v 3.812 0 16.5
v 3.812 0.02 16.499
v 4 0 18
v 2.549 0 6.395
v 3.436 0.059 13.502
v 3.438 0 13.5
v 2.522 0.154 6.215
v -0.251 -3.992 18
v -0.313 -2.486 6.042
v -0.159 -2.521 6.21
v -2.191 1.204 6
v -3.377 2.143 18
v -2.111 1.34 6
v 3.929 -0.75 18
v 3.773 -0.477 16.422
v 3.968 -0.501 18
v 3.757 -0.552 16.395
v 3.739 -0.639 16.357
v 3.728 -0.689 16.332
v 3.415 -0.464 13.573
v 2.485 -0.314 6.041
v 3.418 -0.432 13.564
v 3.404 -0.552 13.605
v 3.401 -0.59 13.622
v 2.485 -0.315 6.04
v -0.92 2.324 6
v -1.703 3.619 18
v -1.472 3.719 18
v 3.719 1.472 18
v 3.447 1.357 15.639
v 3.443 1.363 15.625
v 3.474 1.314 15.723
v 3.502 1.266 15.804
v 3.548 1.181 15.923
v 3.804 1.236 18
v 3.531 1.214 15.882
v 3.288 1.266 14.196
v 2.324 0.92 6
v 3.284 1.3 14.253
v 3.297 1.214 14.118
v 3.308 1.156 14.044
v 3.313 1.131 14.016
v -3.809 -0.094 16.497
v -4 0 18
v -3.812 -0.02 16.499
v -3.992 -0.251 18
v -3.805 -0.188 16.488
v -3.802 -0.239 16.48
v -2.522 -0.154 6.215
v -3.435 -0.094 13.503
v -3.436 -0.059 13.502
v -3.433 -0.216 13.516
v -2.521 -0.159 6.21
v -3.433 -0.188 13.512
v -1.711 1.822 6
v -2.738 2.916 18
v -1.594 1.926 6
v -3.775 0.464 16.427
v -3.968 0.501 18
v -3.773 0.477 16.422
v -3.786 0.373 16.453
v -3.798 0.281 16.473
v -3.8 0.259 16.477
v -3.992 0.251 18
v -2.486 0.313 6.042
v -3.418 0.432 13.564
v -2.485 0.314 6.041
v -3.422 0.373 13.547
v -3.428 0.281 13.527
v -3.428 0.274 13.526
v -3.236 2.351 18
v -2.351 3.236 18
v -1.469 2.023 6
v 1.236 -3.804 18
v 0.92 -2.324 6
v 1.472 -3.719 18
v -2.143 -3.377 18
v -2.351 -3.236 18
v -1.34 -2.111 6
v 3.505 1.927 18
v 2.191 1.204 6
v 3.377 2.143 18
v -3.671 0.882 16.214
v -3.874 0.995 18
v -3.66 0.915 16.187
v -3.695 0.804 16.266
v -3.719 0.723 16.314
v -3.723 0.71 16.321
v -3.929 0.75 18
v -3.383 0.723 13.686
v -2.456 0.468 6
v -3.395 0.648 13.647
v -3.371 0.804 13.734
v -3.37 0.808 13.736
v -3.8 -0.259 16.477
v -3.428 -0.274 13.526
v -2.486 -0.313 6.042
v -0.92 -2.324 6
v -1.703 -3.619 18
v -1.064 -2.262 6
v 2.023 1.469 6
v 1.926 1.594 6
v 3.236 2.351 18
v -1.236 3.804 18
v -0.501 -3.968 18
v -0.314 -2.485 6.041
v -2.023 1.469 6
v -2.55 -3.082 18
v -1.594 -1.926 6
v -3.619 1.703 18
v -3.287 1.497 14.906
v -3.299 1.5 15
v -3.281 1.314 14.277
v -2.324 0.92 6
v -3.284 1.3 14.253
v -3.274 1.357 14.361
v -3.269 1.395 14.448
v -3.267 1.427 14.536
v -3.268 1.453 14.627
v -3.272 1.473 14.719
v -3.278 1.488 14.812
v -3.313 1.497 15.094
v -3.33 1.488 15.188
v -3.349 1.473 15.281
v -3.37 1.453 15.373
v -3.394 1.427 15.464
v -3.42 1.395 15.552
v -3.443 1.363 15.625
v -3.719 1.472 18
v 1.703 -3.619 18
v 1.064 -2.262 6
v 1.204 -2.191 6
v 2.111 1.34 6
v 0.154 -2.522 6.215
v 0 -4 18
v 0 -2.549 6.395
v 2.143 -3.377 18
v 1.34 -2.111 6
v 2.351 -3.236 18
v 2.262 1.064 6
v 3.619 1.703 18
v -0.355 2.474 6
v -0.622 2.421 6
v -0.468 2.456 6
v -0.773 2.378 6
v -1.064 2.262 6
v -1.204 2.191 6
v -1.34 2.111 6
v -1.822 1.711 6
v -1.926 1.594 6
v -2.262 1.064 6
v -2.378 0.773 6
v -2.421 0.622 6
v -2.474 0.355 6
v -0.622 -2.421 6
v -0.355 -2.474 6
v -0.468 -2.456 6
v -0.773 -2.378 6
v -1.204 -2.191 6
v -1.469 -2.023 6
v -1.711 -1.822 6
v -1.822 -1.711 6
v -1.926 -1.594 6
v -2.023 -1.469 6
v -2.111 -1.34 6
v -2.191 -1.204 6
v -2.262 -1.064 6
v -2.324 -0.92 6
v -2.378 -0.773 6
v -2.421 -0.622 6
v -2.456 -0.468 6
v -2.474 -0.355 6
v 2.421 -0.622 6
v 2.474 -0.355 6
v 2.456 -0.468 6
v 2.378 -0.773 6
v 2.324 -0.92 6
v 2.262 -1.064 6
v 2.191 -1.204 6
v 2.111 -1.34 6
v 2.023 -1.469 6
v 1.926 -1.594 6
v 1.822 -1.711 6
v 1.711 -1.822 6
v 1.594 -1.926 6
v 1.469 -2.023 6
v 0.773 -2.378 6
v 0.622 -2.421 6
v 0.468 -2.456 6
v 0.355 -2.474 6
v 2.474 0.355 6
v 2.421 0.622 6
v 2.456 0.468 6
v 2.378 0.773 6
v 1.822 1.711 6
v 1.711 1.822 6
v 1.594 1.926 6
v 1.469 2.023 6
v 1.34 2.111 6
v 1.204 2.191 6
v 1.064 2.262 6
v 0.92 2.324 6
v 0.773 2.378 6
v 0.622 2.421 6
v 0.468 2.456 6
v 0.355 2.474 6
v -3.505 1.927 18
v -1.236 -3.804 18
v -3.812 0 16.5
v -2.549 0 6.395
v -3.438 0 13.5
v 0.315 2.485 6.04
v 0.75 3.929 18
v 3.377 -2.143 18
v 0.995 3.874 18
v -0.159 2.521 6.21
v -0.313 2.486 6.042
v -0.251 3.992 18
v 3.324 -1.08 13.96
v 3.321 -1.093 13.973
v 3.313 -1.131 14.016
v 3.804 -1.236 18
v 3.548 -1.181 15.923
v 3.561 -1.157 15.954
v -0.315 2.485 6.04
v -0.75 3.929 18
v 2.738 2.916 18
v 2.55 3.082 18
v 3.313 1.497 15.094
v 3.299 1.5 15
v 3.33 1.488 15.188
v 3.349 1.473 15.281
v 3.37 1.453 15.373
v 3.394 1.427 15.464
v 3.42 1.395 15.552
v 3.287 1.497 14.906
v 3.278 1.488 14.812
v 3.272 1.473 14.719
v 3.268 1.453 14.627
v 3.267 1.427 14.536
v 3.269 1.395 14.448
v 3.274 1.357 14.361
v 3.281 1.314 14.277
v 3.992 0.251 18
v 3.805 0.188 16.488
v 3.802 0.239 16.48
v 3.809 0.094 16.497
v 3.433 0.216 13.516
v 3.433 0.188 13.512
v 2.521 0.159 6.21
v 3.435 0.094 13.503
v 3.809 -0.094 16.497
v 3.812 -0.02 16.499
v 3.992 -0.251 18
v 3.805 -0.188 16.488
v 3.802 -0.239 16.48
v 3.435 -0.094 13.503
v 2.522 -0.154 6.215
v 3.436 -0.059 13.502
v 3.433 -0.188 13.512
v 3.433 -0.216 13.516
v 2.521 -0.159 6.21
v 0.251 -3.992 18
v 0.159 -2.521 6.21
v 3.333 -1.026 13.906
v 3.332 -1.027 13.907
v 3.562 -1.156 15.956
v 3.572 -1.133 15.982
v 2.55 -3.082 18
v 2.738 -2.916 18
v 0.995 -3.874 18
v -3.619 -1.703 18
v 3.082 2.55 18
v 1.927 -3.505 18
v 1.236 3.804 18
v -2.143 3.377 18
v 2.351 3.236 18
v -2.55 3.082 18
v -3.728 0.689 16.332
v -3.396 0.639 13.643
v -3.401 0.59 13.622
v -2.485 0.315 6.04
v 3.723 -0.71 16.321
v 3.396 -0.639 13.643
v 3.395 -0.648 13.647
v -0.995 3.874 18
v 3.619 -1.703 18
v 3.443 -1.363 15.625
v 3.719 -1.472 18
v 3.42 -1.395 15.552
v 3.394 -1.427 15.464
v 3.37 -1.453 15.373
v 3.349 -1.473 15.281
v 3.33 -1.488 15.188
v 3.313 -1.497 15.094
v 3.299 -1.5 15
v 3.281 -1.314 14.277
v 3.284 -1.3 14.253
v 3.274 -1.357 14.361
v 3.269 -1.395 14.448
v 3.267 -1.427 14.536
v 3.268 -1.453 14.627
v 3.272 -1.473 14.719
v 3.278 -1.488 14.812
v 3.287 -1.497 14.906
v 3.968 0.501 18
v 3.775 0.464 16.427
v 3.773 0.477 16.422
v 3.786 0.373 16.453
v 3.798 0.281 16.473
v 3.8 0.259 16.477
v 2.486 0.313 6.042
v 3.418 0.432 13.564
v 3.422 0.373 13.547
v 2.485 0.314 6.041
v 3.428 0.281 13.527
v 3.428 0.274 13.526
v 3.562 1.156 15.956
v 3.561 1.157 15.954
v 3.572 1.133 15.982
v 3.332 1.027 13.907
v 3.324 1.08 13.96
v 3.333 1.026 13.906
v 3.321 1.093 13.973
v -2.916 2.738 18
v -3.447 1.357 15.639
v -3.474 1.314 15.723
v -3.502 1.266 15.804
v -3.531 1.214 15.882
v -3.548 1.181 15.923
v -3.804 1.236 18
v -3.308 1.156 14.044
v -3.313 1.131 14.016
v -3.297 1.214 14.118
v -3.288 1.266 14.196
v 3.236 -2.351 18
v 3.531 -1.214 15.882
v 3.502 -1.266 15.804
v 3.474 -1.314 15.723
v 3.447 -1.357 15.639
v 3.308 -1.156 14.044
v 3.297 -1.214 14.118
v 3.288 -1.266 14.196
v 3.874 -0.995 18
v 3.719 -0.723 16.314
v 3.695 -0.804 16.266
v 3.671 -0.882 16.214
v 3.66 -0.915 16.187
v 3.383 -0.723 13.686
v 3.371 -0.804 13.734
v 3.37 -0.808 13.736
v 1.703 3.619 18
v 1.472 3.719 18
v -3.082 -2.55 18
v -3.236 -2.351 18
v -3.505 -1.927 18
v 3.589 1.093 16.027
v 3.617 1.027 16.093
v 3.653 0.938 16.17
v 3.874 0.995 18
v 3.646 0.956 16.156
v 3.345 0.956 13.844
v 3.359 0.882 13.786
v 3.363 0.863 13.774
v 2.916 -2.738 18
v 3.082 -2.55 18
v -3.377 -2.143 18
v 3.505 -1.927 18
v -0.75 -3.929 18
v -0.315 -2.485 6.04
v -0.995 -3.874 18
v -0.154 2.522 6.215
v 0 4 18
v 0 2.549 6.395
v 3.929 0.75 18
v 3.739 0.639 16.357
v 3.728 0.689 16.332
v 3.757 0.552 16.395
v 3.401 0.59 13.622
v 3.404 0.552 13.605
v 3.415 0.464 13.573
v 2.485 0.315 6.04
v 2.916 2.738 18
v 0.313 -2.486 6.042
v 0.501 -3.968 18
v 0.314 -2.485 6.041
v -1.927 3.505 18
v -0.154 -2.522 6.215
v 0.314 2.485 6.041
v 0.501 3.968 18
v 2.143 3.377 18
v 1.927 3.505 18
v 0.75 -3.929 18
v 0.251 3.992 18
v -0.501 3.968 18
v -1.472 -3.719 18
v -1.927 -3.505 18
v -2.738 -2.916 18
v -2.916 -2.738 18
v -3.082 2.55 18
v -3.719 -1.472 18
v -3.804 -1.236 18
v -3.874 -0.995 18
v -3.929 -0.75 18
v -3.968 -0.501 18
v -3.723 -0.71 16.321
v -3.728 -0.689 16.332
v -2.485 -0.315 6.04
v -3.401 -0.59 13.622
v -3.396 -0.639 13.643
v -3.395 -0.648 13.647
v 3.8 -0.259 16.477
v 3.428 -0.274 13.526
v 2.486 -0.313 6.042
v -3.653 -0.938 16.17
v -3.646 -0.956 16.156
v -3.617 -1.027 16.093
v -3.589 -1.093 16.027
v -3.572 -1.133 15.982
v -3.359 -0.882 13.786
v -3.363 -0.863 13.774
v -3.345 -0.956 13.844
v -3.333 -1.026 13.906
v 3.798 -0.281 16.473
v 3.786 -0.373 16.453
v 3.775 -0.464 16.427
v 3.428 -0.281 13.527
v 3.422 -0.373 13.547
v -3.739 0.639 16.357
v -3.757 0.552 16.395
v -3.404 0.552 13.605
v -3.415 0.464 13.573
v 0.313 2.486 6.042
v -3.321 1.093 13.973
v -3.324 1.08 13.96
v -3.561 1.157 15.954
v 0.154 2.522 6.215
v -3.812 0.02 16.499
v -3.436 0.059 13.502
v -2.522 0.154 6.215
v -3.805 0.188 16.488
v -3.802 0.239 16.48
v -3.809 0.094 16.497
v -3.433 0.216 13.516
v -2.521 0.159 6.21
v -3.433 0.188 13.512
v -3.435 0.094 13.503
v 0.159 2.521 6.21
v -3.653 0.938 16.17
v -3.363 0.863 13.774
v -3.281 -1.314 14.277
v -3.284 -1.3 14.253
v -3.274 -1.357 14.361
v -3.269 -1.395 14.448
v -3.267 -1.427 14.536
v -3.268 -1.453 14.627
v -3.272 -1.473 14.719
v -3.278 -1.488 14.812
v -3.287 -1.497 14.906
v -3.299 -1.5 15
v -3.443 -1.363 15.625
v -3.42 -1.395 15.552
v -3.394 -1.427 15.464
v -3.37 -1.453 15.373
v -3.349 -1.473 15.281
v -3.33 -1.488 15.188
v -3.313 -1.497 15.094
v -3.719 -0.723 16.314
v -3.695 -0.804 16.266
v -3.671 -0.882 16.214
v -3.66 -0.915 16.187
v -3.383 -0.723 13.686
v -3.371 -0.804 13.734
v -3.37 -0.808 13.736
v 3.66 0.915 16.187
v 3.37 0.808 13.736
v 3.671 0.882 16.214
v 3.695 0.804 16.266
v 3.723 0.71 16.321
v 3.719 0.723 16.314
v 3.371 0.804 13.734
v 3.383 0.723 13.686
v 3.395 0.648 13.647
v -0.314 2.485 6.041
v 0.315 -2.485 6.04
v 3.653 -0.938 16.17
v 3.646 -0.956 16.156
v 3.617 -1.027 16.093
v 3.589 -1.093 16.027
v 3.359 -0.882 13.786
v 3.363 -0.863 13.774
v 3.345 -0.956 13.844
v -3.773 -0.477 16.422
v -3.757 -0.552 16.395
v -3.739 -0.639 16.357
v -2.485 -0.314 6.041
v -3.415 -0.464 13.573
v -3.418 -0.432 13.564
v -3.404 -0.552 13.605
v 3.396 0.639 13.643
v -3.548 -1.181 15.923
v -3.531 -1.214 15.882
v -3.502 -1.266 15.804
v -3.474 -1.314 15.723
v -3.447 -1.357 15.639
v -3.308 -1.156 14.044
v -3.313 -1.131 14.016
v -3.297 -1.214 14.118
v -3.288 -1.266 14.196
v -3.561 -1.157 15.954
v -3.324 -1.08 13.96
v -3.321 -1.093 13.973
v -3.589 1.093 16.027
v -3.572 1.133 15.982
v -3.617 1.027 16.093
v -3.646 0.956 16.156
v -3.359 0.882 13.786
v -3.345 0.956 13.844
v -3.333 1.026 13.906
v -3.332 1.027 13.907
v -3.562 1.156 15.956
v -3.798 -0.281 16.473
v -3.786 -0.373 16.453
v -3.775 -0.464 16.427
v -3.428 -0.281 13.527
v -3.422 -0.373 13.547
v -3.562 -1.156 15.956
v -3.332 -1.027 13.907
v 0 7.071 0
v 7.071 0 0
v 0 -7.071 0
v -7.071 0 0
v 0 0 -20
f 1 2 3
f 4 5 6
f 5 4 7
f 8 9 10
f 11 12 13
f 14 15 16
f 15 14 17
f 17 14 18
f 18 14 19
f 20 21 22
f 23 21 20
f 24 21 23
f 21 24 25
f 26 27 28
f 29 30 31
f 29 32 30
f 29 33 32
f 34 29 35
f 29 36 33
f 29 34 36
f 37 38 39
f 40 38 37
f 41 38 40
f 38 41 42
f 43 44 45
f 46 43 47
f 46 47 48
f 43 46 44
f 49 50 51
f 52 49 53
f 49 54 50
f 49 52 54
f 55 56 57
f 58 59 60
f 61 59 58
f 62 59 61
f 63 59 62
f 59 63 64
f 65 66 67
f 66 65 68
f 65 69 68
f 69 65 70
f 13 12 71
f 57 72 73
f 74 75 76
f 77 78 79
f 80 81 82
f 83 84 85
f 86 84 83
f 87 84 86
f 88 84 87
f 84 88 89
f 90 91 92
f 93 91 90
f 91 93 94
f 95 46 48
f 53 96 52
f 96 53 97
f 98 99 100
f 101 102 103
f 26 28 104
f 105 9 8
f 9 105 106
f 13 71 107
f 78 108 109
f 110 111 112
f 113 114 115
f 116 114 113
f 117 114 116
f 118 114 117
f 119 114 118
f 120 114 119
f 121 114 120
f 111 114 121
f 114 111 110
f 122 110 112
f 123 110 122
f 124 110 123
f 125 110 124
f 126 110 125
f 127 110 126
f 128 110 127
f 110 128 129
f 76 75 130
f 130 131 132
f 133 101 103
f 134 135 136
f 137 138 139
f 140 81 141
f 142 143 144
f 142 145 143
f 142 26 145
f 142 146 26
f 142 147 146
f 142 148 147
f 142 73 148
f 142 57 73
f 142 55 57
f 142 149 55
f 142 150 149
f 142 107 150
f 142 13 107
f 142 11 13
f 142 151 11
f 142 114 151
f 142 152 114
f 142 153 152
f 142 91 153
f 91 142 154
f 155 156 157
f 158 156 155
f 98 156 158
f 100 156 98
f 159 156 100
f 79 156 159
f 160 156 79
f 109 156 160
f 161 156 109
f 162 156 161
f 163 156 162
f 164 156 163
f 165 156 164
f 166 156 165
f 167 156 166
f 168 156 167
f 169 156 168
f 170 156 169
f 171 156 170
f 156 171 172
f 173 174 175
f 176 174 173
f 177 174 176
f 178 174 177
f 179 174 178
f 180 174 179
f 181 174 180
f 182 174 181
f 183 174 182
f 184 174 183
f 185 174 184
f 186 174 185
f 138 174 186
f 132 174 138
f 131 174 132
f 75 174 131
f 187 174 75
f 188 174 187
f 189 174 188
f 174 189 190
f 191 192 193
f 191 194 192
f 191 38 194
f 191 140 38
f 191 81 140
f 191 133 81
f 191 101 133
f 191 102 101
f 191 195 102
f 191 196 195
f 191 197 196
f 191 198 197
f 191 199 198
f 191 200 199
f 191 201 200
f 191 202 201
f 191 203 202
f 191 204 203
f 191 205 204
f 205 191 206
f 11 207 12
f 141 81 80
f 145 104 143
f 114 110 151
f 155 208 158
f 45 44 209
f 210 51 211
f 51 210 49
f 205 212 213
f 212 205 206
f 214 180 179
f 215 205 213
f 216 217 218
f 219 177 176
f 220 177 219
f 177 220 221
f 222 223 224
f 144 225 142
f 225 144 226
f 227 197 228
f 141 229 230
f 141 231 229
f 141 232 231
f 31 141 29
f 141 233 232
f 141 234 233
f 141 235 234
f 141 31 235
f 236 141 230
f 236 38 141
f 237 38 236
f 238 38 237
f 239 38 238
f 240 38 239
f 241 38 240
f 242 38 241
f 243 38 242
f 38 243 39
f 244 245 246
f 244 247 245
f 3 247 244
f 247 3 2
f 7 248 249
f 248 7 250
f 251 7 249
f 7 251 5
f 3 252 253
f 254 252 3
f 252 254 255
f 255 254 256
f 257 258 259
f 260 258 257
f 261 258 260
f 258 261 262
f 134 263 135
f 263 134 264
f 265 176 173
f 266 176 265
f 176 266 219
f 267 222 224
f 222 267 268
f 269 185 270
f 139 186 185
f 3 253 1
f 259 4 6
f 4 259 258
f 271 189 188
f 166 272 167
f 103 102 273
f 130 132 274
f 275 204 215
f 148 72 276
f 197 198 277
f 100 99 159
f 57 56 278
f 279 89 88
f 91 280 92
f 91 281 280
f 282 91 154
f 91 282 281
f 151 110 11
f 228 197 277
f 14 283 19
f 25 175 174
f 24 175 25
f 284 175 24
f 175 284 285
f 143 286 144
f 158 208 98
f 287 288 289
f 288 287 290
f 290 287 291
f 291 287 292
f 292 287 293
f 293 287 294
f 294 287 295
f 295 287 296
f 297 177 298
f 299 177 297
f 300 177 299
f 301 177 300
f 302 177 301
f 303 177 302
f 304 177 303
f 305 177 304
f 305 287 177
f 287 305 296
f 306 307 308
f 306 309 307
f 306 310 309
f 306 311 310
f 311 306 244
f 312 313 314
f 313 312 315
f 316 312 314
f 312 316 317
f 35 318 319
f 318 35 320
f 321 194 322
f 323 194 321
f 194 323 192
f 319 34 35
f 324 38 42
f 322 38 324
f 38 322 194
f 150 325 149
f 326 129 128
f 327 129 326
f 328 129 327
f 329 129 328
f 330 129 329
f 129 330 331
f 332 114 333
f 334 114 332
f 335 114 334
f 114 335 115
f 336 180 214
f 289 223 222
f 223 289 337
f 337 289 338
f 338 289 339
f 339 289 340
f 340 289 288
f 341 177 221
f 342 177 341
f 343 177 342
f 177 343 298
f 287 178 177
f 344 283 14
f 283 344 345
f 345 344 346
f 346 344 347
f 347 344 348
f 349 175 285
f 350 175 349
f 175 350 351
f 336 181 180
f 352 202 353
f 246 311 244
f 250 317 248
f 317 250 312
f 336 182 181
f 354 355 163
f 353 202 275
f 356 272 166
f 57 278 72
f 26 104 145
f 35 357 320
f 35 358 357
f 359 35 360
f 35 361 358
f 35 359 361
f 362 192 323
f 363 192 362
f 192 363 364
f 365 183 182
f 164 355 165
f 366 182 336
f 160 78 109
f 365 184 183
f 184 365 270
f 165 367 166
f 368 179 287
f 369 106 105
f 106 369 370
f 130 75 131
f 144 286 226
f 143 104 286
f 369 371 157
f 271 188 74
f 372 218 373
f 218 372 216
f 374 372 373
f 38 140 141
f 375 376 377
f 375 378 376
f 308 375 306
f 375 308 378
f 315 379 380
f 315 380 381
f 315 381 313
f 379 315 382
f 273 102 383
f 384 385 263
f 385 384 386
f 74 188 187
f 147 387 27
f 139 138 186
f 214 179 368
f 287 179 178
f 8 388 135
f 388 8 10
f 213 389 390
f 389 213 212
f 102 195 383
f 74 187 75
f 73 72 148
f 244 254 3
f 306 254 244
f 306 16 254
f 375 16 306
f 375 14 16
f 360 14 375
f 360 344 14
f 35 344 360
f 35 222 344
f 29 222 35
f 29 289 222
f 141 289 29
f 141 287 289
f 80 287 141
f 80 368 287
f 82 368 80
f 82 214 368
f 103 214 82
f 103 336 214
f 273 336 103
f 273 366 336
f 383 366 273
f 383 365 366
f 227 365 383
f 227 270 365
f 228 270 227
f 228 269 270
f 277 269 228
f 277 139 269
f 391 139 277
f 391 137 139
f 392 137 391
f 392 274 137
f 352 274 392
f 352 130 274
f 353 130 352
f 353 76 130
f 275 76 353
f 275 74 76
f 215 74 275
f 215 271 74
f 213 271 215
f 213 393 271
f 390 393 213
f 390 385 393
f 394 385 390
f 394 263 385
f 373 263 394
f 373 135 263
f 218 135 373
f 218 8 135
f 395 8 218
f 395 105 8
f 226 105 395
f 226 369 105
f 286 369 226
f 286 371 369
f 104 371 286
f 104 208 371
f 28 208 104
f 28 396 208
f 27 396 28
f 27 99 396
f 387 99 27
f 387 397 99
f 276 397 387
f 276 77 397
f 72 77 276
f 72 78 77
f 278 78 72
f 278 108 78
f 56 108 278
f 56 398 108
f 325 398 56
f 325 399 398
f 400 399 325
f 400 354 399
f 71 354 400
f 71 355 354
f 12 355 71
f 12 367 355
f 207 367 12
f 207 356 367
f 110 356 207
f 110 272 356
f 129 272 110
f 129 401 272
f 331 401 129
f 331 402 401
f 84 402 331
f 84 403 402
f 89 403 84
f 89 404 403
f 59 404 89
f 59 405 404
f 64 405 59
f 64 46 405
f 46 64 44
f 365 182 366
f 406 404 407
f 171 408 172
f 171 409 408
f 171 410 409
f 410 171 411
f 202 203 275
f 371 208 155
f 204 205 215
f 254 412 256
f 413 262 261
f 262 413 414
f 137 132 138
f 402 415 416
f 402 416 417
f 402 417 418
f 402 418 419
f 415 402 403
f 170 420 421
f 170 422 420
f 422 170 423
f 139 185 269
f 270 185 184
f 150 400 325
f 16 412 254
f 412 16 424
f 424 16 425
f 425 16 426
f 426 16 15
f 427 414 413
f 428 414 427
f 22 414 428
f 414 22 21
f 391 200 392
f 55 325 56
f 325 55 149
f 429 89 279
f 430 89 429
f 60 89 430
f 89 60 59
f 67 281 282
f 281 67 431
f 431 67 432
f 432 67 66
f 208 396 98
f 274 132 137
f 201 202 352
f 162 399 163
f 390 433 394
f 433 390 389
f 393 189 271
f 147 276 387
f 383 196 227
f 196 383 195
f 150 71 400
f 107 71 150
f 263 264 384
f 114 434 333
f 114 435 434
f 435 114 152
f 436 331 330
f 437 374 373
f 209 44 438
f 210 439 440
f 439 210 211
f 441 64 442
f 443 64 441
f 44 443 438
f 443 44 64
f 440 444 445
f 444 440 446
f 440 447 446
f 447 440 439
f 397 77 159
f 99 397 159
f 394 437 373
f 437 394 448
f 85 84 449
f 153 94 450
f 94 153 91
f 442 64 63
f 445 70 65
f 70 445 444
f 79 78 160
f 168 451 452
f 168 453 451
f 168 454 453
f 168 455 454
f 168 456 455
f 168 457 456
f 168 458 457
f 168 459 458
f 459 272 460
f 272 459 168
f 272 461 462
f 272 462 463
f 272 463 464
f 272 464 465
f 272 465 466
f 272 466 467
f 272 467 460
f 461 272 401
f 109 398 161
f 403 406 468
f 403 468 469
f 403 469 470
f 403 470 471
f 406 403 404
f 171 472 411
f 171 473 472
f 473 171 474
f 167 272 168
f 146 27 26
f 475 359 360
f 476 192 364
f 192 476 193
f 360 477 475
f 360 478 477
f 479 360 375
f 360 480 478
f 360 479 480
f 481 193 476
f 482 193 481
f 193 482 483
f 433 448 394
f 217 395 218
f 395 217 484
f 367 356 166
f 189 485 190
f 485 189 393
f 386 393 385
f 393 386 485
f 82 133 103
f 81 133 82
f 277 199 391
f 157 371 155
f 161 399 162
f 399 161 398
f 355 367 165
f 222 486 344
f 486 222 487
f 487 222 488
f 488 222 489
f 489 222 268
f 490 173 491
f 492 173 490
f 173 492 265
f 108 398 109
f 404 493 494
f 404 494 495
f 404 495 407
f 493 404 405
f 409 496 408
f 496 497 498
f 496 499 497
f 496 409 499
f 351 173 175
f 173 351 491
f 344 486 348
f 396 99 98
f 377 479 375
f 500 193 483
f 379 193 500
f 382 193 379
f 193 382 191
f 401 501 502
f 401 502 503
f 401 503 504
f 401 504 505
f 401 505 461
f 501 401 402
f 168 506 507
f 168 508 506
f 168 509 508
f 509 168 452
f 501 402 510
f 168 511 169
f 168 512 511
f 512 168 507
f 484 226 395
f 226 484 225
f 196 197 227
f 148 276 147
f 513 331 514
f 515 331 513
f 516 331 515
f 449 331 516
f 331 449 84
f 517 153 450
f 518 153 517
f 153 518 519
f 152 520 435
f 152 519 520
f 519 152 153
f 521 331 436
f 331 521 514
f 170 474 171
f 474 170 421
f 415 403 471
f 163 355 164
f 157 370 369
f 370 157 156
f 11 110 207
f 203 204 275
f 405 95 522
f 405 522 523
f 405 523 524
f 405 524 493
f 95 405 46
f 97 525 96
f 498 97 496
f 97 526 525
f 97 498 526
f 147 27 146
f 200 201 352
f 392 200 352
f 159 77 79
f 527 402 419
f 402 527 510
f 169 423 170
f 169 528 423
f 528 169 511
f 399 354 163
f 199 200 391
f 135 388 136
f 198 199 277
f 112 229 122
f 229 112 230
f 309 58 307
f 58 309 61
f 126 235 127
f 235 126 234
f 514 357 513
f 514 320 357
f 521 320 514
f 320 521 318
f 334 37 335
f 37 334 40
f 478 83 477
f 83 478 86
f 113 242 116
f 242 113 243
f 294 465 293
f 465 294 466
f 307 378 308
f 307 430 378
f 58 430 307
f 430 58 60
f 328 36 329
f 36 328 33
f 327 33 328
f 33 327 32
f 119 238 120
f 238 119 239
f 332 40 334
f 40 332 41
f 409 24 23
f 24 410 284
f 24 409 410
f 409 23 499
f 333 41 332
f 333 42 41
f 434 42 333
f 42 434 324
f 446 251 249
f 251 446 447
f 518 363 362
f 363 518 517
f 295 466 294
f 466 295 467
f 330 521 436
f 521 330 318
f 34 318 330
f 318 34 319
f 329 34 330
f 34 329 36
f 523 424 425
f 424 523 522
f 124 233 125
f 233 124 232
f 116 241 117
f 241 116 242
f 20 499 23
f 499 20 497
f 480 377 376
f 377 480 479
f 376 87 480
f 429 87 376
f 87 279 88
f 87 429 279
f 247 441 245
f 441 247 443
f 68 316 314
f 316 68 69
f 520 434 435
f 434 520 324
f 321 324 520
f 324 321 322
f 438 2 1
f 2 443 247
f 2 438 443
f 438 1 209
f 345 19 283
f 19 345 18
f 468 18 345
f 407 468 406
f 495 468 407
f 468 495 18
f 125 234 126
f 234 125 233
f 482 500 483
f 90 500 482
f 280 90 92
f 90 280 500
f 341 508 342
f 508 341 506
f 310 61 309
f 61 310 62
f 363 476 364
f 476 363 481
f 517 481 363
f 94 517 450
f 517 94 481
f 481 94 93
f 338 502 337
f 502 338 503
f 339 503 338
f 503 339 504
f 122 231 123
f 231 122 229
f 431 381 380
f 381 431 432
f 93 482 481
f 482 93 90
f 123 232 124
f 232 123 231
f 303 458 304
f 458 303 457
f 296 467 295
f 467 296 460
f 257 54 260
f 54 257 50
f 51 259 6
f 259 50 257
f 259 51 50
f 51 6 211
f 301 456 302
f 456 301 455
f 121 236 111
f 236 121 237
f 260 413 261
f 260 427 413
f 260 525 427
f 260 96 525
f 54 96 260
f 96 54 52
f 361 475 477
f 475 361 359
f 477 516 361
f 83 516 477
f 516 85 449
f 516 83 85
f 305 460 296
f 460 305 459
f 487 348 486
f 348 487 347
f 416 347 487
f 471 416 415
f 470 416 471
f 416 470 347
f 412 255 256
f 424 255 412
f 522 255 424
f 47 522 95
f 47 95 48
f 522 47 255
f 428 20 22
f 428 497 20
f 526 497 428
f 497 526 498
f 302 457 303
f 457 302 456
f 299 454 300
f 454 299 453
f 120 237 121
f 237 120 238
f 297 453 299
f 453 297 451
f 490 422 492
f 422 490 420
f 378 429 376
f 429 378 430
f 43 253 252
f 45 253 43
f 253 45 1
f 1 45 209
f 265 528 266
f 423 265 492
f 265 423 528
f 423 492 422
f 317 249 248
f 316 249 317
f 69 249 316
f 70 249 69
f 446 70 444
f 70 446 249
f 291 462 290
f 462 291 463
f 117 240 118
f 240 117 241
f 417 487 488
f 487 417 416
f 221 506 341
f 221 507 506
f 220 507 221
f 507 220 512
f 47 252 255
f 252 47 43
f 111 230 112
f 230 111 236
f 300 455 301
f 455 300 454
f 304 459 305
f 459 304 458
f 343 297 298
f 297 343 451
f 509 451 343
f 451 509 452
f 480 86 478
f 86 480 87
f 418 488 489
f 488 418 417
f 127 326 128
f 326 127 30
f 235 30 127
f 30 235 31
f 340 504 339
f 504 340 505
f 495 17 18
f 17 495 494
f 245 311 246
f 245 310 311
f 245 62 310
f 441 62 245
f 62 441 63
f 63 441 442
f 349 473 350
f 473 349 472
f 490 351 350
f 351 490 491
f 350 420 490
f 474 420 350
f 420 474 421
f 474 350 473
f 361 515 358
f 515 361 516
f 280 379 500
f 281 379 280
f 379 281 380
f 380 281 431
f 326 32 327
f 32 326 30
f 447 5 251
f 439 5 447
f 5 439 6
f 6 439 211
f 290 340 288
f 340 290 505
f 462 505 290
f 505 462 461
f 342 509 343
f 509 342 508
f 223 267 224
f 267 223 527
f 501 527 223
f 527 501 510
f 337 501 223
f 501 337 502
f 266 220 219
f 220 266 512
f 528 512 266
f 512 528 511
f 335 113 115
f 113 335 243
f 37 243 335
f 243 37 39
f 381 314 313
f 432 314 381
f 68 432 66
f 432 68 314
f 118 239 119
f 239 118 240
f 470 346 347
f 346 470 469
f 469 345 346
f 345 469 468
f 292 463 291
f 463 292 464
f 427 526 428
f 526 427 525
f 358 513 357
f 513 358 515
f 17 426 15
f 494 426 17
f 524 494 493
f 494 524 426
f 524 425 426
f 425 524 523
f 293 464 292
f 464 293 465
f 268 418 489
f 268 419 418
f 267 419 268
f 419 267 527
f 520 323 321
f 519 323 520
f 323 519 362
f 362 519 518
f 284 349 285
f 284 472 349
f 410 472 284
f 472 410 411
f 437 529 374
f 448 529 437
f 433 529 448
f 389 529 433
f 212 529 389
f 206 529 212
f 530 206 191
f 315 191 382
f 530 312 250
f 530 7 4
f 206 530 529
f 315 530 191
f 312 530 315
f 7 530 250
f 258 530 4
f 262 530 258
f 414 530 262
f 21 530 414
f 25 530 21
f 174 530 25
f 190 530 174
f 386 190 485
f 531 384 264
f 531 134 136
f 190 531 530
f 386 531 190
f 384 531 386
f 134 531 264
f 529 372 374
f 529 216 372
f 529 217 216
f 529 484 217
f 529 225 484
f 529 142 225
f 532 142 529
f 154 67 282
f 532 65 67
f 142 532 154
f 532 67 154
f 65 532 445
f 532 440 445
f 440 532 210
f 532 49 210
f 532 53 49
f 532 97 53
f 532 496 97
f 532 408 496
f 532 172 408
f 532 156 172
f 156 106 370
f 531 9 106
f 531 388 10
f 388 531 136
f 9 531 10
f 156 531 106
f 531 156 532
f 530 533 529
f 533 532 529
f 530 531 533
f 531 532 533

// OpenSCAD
hole_size = 1.5; //Radius of the hole.
//To make a hole on the top cylinder.
difference() {
   translate([0,0,12])
	cylinder(12,2.5,4, center = true, $fn=100);

	translate([0,0,15]) 
	rotate([90,0,90])
      cylinder (10, hole_size,hole_size, center = true, $fn=100);
}

// 2 Pyramids to complete the model.
// We can do this in a loop with variables, but have kept it simple to be clear.

//1st pyramid for the top part.

apex_point_top_pyramid = 10; //Apex point for top pyramid, which is inside the cylinder.
rotate(a=[0,0,45])
polyhedron(
  points=[ [5,5,0],[5,-5,0],[-5,-5,0],[-5,5,0], // the four points at base
           [0,0,apex_point_top_pyramid]  ],                                 // the apex point 
  triangles=[ [0,1,4],[1,2,4],[2,3,4],[3,0,4],          // each triangle side
              [1,0,3],[2,1,3] ]                         // two triangles for square base
 );


//2nd pyramid for the bottom part.
apex_point_bottom_pyramid = 20;
rotate(a=[180,0,45])
polyhedron(
  points=[ [5,5,0],[5,-5,0],[-5,-5,0],[-5,5,0], // the four points at base
           [0,0,apex_point_bottom_pyramid]  ],                                 // the apex point 
  triangles=[ [0,1,4],[1,2,4],[2,3,4],[3,0,4],          // each triangle side
              [1,0,3],[2,1,3] ]                         // two triangles for square base
 );
